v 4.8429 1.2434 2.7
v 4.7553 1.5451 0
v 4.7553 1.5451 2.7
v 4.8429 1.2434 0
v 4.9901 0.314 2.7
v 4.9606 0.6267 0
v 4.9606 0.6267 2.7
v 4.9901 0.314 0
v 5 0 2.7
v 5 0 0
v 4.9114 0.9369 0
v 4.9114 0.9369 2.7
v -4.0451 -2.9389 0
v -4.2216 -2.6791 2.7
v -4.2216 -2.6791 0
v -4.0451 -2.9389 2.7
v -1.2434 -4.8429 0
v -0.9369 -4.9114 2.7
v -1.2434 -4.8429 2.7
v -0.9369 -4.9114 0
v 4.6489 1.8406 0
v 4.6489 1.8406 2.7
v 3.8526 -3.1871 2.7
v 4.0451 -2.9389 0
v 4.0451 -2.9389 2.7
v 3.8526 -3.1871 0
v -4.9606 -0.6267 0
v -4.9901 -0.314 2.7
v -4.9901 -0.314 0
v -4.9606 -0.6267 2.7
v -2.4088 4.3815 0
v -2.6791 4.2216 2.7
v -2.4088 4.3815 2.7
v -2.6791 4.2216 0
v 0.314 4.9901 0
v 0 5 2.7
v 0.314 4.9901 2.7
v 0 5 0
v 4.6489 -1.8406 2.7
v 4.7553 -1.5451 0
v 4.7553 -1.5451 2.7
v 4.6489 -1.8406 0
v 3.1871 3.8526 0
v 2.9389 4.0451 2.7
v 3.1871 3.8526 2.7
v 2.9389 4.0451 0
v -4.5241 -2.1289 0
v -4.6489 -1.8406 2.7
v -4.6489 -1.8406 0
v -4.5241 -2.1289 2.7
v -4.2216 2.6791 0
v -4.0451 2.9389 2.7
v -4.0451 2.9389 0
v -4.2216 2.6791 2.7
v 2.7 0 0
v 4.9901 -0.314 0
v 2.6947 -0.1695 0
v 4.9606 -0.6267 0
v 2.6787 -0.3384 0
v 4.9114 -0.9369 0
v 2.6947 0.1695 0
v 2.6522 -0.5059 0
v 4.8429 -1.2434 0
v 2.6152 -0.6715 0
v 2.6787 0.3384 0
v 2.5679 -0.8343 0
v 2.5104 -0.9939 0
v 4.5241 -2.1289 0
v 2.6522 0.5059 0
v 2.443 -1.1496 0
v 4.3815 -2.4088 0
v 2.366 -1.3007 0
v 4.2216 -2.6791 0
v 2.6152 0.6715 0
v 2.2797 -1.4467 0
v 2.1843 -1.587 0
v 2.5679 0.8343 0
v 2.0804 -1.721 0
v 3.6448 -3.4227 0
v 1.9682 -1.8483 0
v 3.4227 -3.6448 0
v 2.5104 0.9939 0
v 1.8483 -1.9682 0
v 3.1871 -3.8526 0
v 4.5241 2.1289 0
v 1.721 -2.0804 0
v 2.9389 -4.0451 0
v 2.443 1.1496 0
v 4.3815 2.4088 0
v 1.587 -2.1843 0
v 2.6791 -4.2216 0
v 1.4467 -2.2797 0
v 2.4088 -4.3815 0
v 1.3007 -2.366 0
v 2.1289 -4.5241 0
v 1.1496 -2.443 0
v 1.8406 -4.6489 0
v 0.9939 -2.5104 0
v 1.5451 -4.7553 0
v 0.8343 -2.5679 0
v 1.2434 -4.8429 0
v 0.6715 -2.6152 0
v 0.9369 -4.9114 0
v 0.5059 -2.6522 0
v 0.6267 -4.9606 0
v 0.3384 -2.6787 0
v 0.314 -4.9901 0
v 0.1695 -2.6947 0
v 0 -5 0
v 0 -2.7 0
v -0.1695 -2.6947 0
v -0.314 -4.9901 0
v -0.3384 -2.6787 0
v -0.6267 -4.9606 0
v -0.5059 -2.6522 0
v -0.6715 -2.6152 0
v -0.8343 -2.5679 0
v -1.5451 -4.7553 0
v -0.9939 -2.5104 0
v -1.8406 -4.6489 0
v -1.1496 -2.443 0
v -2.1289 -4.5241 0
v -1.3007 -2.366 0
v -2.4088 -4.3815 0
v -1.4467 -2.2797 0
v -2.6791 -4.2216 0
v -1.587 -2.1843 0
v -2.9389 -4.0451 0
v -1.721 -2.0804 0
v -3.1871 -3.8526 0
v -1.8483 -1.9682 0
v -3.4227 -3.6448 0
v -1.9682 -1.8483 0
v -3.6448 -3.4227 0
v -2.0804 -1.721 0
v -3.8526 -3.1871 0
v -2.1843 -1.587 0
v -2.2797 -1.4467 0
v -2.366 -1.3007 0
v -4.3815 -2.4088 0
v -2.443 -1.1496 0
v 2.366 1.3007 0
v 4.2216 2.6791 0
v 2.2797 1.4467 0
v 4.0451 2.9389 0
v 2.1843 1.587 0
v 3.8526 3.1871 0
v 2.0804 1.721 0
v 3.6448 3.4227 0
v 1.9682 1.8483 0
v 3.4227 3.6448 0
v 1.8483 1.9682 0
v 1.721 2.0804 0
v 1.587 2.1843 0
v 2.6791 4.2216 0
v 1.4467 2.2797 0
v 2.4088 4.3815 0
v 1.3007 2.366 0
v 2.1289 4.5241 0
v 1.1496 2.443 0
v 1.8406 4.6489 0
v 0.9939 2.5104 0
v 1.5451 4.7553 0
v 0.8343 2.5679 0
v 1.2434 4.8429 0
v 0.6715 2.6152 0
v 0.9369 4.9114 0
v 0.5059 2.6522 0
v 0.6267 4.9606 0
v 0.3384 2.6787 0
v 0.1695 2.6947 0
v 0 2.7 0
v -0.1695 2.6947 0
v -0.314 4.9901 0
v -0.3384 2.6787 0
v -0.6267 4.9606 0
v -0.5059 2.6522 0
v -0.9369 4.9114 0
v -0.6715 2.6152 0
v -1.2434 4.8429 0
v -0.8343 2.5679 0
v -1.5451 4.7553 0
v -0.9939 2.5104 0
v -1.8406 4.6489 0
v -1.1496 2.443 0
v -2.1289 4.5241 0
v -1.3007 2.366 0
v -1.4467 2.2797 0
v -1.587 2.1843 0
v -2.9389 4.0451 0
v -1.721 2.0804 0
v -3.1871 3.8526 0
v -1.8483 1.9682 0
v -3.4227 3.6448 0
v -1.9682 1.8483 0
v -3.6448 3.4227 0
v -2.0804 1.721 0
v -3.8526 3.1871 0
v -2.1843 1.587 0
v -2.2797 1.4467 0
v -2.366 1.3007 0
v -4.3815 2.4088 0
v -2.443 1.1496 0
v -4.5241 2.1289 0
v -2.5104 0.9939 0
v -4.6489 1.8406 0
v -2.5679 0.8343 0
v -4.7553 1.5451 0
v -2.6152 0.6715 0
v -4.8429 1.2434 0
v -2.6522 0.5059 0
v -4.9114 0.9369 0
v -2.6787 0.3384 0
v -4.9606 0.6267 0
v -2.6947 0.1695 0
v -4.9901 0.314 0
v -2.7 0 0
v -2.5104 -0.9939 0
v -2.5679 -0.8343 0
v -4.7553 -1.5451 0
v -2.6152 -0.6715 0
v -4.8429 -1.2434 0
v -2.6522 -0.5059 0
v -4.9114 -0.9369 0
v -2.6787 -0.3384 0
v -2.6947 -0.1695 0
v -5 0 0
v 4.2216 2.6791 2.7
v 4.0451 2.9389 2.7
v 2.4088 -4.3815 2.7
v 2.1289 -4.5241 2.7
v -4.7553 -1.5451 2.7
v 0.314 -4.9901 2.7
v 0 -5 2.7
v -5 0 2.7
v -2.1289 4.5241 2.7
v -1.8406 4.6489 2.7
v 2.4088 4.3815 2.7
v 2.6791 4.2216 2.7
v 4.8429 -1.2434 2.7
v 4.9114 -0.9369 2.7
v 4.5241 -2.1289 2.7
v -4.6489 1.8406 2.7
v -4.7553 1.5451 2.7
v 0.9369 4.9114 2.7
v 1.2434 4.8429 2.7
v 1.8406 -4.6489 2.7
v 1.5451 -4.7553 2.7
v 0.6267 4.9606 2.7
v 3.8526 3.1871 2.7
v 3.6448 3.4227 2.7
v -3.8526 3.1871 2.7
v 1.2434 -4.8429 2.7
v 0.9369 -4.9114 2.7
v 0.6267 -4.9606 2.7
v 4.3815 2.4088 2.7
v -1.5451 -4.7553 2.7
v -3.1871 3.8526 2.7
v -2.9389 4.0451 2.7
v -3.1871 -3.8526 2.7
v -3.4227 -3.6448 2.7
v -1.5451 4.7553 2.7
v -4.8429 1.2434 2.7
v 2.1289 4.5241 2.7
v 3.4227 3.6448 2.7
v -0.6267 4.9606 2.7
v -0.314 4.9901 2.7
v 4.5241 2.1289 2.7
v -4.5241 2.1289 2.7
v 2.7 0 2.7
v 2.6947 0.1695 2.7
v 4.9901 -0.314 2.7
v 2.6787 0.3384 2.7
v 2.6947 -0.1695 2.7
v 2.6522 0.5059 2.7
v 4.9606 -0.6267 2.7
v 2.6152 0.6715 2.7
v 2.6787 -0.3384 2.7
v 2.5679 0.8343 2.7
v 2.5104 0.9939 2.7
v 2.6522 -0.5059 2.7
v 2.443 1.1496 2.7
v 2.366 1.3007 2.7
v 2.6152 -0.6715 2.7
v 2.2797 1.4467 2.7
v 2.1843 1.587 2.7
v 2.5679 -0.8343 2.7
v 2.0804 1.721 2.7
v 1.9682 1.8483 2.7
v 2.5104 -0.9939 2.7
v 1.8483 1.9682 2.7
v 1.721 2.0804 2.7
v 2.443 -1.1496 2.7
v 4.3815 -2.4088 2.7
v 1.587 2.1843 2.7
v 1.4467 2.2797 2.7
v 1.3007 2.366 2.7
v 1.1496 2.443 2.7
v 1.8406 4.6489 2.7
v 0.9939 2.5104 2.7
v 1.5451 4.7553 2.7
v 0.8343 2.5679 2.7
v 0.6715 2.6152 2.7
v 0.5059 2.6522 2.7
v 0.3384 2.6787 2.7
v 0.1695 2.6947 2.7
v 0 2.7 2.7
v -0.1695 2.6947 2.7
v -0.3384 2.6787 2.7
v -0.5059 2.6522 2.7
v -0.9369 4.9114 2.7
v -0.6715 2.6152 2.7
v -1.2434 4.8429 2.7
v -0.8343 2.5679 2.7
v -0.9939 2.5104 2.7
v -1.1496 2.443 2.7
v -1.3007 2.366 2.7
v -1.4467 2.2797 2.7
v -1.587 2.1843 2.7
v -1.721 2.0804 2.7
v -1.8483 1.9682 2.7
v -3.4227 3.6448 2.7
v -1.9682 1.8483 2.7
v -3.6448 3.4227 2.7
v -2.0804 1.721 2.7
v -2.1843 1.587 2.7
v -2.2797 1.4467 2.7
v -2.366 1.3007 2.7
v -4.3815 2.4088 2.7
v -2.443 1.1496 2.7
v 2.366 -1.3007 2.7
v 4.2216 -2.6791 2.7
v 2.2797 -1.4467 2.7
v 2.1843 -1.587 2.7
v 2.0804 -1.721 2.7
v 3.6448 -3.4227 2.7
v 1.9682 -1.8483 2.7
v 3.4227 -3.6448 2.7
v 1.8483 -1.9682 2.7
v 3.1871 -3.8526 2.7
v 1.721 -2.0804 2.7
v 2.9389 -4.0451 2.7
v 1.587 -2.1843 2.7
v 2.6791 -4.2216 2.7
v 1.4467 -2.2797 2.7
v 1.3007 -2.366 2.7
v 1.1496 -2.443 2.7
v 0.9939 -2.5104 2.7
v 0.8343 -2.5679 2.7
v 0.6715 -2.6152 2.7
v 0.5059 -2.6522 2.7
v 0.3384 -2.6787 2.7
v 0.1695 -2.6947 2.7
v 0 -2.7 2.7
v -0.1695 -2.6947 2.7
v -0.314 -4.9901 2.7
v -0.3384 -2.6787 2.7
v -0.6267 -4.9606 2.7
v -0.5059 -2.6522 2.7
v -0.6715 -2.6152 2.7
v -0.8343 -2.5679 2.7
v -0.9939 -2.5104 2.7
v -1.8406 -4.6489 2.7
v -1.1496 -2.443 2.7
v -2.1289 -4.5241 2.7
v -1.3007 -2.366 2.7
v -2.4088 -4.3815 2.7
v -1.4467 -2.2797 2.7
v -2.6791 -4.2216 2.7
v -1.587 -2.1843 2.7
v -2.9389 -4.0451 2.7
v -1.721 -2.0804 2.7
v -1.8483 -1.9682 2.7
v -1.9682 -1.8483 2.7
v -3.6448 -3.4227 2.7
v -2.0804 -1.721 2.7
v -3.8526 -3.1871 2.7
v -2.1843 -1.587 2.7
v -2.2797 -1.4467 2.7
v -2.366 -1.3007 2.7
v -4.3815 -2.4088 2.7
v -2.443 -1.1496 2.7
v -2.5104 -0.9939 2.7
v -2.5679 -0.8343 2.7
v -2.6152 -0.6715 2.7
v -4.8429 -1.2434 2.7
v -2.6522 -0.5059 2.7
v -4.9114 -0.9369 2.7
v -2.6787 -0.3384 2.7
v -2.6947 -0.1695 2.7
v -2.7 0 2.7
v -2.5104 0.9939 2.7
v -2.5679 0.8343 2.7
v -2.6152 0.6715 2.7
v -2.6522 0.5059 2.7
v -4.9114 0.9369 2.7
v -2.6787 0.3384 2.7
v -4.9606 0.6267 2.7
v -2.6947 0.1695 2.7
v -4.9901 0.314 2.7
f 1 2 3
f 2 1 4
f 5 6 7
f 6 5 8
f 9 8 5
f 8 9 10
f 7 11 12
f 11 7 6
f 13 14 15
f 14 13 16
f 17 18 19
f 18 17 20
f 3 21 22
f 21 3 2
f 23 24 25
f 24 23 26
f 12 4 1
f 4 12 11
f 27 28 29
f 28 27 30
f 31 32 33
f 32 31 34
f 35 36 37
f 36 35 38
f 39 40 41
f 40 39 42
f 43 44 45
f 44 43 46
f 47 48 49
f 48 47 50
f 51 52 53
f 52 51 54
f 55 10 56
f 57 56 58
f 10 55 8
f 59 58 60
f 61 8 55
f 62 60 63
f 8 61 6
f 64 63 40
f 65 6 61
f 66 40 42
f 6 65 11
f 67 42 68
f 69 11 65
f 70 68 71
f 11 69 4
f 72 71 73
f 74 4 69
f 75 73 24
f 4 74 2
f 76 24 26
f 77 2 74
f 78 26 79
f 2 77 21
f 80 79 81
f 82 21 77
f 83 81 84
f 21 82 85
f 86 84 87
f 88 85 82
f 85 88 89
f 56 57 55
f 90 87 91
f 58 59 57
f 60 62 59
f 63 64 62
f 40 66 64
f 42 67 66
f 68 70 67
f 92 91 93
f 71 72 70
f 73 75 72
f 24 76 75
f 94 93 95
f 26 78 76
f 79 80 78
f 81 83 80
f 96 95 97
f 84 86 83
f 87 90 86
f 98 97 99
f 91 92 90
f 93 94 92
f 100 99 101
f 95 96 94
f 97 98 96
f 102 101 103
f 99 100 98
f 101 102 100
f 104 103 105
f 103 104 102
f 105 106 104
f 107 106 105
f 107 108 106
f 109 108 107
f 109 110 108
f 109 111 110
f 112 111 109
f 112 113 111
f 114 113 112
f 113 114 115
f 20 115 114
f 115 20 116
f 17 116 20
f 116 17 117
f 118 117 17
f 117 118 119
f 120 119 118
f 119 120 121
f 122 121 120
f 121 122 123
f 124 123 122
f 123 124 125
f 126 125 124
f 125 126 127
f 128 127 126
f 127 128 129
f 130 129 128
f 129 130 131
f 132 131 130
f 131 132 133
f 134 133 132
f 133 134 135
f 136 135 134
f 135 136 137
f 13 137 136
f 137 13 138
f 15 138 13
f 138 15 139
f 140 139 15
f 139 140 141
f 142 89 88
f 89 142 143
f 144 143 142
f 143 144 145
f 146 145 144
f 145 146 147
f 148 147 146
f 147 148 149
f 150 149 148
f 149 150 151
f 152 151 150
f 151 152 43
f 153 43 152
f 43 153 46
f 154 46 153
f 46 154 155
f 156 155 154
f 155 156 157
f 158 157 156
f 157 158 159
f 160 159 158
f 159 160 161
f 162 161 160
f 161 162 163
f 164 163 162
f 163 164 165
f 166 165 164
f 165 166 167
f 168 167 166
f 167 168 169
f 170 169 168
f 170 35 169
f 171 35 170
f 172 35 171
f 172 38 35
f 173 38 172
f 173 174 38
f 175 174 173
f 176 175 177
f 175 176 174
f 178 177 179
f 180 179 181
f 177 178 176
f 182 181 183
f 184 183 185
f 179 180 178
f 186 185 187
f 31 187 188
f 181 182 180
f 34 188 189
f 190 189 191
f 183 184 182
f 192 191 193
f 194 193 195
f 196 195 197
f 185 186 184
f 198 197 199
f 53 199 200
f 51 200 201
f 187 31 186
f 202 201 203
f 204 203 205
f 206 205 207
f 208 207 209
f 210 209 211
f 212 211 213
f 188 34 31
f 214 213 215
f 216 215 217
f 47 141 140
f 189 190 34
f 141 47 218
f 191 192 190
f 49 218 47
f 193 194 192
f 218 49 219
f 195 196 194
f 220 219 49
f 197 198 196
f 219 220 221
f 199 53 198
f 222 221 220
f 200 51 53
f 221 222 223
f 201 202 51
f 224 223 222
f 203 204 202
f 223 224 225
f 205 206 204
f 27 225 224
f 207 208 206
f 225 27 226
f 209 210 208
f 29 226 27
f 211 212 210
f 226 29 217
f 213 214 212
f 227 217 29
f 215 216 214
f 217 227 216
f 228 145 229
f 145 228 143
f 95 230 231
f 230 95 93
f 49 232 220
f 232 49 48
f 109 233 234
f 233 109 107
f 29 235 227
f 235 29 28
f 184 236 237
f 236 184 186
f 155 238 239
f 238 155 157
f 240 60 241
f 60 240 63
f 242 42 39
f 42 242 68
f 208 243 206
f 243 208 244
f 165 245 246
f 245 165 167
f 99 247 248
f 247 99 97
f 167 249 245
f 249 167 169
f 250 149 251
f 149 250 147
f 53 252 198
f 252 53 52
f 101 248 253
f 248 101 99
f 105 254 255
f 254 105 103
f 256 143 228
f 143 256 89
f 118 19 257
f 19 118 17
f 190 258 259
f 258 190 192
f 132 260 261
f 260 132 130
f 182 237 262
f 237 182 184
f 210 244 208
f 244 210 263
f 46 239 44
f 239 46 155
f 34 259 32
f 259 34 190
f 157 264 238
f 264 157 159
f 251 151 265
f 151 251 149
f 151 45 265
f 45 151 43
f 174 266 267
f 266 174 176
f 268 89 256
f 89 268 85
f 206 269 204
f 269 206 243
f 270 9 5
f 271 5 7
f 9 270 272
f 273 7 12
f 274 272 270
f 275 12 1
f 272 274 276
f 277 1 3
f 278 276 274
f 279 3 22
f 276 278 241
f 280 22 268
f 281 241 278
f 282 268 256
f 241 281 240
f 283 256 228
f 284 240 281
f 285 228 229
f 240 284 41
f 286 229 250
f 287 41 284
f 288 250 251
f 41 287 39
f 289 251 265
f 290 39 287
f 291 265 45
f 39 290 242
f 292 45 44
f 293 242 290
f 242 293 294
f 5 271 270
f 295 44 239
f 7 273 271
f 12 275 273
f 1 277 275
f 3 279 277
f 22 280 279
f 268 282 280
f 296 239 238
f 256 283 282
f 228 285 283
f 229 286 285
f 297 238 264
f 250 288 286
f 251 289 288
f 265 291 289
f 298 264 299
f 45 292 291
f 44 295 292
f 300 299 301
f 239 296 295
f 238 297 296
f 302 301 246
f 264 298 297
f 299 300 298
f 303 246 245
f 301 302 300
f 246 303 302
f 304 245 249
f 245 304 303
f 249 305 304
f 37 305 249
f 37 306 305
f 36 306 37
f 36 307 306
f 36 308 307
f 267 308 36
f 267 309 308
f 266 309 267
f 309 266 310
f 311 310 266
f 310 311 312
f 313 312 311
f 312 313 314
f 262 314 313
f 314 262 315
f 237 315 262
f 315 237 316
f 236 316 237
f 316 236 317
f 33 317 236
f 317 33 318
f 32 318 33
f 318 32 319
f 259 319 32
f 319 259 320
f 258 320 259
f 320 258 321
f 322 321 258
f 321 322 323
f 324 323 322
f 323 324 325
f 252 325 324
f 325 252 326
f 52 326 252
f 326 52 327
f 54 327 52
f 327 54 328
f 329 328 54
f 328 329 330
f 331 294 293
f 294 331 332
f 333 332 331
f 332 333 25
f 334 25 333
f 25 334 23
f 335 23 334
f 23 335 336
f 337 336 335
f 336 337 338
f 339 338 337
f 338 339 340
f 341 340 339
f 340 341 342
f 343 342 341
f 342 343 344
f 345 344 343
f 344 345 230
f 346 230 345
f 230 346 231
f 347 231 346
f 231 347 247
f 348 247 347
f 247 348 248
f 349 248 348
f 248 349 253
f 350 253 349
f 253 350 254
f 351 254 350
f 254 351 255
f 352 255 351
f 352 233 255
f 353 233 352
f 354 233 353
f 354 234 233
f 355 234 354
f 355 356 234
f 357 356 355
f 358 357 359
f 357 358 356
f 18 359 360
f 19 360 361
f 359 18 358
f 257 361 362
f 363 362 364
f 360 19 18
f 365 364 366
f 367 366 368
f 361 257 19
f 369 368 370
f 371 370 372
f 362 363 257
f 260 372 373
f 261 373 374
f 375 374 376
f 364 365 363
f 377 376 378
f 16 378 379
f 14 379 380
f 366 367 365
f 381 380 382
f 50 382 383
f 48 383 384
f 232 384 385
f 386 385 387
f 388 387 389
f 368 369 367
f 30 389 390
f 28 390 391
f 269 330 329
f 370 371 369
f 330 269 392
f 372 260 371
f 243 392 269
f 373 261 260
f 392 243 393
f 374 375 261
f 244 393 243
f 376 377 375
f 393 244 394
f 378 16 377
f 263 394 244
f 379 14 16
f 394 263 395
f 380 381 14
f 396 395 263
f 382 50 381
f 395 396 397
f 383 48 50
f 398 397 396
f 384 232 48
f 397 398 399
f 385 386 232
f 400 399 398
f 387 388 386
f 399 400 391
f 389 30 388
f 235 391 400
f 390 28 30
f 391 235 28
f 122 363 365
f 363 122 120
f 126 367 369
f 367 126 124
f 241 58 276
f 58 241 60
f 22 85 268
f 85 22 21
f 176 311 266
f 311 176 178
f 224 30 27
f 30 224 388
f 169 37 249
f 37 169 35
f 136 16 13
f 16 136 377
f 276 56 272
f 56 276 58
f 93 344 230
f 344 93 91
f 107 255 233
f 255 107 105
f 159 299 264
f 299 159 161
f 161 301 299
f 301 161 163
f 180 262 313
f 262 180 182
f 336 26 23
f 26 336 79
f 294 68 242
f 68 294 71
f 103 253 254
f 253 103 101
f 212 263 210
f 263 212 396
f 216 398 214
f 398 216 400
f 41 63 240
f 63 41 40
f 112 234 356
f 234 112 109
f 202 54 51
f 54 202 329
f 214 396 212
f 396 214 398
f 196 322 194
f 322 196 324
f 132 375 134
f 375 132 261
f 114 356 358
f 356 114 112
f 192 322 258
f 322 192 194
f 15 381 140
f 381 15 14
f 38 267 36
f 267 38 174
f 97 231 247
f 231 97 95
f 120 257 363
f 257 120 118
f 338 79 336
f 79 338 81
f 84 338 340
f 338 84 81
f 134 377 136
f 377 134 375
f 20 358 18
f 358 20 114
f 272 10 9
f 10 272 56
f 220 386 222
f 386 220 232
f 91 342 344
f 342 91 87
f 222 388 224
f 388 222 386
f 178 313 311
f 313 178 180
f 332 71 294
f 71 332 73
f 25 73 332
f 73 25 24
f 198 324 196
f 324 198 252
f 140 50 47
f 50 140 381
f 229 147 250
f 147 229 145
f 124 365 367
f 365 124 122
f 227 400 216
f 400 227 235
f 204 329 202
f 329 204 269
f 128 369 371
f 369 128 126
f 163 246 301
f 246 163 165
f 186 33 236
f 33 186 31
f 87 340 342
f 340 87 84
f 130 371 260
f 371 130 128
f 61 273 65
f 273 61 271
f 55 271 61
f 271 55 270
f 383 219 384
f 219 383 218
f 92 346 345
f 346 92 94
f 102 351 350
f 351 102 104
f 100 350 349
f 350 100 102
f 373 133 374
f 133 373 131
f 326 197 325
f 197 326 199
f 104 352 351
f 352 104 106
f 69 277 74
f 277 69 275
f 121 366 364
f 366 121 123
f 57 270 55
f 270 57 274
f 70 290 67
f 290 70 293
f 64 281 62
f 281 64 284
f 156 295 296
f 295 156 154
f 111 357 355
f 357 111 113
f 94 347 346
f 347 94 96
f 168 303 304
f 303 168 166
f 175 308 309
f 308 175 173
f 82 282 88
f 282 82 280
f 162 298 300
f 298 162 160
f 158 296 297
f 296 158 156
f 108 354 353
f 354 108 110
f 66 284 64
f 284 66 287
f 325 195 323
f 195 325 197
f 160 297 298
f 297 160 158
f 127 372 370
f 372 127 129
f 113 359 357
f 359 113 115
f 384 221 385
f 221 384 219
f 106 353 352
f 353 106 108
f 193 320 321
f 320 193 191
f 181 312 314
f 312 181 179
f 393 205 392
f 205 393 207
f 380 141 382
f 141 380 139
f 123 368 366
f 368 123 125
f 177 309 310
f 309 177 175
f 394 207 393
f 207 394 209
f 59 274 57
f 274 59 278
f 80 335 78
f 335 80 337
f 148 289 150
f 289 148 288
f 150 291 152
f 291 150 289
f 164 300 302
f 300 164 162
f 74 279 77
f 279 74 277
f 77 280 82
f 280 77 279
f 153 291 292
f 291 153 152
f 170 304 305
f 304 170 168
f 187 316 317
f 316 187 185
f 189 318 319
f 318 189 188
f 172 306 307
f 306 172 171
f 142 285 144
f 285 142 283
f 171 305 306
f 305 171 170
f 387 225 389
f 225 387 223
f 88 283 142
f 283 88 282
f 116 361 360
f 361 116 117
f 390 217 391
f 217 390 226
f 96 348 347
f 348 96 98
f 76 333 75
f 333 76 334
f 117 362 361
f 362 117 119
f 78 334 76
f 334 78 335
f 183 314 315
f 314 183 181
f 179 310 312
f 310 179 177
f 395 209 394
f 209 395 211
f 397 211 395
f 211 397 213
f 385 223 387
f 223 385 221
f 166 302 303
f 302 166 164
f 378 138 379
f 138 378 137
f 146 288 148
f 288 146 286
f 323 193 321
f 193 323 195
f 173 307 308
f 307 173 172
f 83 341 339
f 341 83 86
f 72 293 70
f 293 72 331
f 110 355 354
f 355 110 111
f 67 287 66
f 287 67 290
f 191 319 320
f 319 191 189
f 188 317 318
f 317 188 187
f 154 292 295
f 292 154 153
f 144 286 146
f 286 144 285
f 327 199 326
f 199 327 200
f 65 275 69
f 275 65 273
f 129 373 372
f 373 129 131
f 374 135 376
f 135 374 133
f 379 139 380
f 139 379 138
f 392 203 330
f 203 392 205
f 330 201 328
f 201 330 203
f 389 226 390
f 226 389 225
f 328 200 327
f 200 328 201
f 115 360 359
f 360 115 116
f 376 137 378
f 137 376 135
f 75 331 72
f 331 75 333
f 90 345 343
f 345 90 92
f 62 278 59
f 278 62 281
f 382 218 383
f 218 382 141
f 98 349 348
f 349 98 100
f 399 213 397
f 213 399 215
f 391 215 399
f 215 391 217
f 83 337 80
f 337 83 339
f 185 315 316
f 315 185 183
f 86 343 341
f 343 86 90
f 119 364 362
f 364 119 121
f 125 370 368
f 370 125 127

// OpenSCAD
$fn=100;
difference() {
  cylinder(r=5, h=2.7);
  cylinder(r=2.7, h=2.7);
}
